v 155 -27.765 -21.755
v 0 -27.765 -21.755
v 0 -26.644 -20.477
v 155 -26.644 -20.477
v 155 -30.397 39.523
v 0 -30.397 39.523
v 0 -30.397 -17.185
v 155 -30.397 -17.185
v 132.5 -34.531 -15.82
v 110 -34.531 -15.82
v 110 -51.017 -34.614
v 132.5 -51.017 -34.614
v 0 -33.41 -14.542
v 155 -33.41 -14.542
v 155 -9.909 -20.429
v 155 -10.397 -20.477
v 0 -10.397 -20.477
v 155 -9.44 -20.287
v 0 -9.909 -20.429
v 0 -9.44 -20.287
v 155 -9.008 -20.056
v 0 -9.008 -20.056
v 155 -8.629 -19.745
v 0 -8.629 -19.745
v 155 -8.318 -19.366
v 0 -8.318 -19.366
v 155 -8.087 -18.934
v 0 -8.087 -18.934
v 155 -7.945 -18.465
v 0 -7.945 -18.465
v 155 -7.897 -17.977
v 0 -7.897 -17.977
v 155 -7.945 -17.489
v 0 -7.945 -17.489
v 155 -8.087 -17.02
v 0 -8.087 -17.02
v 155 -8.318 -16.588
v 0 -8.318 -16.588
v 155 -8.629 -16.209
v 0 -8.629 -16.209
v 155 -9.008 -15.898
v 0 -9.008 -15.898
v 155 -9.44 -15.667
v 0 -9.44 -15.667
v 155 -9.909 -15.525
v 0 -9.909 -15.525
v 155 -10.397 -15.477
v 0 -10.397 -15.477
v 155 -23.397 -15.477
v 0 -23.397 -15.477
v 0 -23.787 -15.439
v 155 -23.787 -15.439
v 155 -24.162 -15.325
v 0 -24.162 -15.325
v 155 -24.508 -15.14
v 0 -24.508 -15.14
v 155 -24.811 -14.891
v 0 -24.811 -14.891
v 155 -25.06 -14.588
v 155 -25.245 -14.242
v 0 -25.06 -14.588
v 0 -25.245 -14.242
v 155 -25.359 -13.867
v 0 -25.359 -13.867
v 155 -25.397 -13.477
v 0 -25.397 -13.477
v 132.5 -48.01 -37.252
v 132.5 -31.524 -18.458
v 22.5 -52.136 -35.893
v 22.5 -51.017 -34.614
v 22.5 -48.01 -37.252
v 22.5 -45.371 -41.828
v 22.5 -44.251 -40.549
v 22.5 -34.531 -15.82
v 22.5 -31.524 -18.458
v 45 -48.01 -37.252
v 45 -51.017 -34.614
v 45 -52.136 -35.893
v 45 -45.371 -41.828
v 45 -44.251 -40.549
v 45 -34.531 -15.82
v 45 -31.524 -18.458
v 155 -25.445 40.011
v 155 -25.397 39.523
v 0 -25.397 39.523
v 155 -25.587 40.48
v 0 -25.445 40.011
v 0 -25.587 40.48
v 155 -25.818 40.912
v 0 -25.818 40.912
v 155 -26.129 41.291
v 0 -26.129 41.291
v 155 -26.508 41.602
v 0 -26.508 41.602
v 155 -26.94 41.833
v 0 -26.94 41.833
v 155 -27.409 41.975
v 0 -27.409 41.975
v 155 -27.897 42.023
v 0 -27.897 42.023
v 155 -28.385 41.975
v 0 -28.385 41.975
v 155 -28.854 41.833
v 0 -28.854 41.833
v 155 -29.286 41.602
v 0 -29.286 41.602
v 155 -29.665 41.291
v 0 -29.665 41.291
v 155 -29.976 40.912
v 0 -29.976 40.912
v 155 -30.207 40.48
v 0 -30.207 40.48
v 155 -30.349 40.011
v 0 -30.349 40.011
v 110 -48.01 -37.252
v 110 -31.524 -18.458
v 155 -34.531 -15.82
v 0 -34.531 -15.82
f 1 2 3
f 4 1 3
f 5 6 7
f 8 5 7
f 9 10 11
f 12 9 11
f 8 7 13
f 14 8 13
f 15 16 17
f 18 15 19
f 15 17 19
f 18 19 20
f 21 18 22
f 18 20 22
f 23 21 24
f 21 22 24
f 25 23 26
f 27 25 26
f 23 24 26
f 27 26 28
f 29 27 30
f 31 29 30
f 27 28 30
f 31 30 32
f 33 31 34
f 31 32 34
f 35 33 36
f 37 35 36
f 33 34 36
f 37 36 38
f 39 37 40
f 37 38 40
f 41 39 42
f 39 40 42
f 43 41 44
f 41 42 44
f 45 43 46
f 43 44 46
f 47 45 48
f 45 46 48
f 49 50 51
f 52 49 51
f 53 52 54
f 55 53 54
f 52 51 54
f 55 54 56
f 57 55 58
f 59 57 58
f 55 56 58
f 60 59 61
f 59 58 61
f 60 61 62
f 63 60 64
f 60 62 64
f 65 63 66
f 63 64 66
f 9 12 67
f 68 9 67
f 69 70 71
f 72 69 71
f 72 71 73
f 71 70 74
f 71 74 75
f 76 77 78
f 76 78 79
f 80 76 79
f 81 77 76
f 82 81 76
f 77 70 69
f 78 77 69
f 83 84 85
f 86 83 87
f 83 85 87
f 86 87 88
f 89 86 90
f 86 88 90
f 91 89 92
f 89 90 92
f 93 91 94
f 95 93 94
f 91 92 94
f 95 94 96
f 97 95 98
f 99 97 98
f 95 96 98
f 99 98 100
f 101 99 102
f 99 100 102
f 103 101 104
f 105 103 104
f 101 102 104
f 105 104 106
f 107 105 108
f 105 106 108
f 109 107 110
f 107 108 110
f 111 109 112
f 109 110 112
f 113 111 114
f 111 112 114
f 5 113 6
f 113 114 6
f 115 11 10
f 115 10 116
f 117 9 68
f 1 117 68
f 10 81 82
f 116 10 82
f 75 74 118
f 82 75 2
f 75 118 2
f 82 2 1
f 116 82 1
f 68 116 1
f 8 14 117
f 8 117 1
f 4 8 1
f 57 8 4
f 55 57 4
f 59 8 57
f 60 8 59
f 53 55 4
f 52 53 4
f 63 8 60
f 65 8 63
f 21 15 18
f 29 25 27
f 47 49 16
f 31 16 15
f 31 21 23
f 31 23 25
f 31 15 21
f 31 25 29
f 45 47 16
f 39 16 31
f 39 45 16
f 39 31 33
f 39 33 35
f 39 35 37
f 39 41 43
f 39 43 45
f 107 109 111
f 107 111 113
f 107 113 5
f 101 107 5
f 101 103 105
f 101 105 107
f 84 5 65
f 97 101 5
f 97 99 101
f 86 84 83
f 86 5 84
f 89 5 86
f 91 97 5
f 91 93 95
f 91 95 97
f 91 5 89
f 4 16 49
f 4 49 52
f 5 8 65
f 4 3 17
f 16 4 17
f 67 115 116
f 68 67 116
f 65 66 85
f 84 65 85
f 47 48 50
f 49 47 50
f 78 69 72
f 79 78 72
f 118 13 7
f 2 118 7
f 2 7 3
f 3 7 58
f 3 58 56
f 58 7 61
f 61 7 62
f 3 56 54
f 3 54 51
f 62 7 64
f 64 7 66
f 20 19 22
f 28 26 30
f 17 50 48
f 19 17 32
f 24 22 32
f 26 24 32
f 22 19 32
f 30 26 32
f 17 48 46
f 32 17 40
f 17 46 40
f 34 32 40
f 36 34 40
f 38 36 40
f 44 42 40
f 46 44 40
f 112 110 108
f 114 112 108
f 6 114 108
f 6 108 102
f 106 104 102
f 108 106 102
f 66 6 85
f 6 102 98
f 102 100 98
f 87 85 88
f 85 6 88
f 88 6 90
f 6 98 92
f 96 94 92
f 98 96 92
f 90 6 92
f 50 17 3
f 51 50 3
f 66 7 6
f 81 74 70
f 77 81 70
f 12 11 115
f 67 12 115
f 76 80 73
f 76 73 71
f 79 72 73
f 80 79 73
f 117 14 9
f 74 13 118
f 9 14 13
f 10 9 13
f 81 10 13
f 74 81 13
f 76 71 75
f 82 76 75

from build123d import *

# Parameters (mm, degrees)
F1_DEPTH = 155
F3_DEPTH = 155
F5_START = 22.5
F5_DEPTH = 22.5
F6_START = 110
F6_DEPTH = 22.5
F8_START = 22.5
F8_DEPTH = 22.5


# Not quite as in the source:
# - a feature of the source that left no trace in its solid (it failed there, or was rolled back) is left out


with BuildPart() as f1:
    # F0 (on Right) → F1 (new body)
    with BuildSketch(Plane.YZ):
        with BuildLine():
            Line((-25.3971134126, 39.5229434967), (-30.3971134126, 39.5229434967))
            Line((-30.3971134126, 39.5229434967), (-30.3971134126, -18.4770565033))
            ThreePointArc((-30.3971134126, -18.4770565033), (-29.811326975, -19.8912700657), (-28.3971134126, -20.4770565033))
            Line((-28.3971134126, -20.4770565033), (-10.3971134126, -20.4770565033))
            Line((-10.3971134126, -20.4770565033), (-10.3971134126, -15.4770565033))
            Line((-10.3971134126, -15.4770565033), (-23.3971134126, -15.4770565033))
            ThreePointArc((-23.3971134126, -15.4770565033), (-24.811326975, -14.8912700657), (-25.3971134126, -13.4770565033))
            Line((-25.3971134126, -13.4770565033), (-25.3971134126, 39.5229434967))
        make_face()
        with BuildLine():
            ThreePointArc((-25.3971134126, 39.5229434967), (-27.8971134126, 42.0229434967), (-30.3971134126, 39.5229434967))
            Line((-30.3971134126, 39.5229434967), (-25.3971134126, 39.5229434967))
        make_face()
        with BuildLine():
            Line((-10.3971134126, -15.4770565033), (-10.3971134126, -20.4770565033))
            ThreePointArc((-10.3971134126, -20.4770565033), (-7.8971134126, -17.9770565033), (-10.3971134126, -15.4770565033))
        make_face()
    extrude(amount=F1_DEPTH)

    # F2 (on Right) → F3 (join)
    with BuildSketch(Plane.YZ):
        Polygon((-26.6438154831, -20.4771793517), (-33.4096477321, -14.5422392527), (-34.530691973, -15.8202297886), (-27.764859724, -21.7551698876), align=None)
    extrude(amount=F3_DEPTH)

    # F4 (on Right) → F5 (join)
    with BuildSketch(Plane.YZ.offset(F5_START)):
        Polygon((-31.5236554179, -18.4579809437), (-34.530691973, -15.8202297886), (-51.0166366924, -34.614208258), (-48.0096001373, -37.2519594131), align=None)
    extrude(amount=F5_DEPTH)

    # F4 (on Right) → F6 (join)
    with BuildSketch(Plane.YZ.offset(F6_START)):
        Polygon((-31.5236554179, -18.4579809437), (-34.530691973, -15.8202297886), (-51.0166366924, -34.614208258), (-48.0096001373, -37.2519594131), align=None)
    extrude(amount=F6_DEPTH)

    # F7 (on Right) → F8 (join)
    with BuildSketch(Plane.YZ.offset(F8_START)):
        Polygon((-51.0166366924, -34.614208258), (-52.136497942, -35.8932355375), (-45.370665693, -41.8281756365), (-44.2508044434, -40.549148357), align=None)
    extrude(amount=F8_DEPTH)


solid = f1.part
